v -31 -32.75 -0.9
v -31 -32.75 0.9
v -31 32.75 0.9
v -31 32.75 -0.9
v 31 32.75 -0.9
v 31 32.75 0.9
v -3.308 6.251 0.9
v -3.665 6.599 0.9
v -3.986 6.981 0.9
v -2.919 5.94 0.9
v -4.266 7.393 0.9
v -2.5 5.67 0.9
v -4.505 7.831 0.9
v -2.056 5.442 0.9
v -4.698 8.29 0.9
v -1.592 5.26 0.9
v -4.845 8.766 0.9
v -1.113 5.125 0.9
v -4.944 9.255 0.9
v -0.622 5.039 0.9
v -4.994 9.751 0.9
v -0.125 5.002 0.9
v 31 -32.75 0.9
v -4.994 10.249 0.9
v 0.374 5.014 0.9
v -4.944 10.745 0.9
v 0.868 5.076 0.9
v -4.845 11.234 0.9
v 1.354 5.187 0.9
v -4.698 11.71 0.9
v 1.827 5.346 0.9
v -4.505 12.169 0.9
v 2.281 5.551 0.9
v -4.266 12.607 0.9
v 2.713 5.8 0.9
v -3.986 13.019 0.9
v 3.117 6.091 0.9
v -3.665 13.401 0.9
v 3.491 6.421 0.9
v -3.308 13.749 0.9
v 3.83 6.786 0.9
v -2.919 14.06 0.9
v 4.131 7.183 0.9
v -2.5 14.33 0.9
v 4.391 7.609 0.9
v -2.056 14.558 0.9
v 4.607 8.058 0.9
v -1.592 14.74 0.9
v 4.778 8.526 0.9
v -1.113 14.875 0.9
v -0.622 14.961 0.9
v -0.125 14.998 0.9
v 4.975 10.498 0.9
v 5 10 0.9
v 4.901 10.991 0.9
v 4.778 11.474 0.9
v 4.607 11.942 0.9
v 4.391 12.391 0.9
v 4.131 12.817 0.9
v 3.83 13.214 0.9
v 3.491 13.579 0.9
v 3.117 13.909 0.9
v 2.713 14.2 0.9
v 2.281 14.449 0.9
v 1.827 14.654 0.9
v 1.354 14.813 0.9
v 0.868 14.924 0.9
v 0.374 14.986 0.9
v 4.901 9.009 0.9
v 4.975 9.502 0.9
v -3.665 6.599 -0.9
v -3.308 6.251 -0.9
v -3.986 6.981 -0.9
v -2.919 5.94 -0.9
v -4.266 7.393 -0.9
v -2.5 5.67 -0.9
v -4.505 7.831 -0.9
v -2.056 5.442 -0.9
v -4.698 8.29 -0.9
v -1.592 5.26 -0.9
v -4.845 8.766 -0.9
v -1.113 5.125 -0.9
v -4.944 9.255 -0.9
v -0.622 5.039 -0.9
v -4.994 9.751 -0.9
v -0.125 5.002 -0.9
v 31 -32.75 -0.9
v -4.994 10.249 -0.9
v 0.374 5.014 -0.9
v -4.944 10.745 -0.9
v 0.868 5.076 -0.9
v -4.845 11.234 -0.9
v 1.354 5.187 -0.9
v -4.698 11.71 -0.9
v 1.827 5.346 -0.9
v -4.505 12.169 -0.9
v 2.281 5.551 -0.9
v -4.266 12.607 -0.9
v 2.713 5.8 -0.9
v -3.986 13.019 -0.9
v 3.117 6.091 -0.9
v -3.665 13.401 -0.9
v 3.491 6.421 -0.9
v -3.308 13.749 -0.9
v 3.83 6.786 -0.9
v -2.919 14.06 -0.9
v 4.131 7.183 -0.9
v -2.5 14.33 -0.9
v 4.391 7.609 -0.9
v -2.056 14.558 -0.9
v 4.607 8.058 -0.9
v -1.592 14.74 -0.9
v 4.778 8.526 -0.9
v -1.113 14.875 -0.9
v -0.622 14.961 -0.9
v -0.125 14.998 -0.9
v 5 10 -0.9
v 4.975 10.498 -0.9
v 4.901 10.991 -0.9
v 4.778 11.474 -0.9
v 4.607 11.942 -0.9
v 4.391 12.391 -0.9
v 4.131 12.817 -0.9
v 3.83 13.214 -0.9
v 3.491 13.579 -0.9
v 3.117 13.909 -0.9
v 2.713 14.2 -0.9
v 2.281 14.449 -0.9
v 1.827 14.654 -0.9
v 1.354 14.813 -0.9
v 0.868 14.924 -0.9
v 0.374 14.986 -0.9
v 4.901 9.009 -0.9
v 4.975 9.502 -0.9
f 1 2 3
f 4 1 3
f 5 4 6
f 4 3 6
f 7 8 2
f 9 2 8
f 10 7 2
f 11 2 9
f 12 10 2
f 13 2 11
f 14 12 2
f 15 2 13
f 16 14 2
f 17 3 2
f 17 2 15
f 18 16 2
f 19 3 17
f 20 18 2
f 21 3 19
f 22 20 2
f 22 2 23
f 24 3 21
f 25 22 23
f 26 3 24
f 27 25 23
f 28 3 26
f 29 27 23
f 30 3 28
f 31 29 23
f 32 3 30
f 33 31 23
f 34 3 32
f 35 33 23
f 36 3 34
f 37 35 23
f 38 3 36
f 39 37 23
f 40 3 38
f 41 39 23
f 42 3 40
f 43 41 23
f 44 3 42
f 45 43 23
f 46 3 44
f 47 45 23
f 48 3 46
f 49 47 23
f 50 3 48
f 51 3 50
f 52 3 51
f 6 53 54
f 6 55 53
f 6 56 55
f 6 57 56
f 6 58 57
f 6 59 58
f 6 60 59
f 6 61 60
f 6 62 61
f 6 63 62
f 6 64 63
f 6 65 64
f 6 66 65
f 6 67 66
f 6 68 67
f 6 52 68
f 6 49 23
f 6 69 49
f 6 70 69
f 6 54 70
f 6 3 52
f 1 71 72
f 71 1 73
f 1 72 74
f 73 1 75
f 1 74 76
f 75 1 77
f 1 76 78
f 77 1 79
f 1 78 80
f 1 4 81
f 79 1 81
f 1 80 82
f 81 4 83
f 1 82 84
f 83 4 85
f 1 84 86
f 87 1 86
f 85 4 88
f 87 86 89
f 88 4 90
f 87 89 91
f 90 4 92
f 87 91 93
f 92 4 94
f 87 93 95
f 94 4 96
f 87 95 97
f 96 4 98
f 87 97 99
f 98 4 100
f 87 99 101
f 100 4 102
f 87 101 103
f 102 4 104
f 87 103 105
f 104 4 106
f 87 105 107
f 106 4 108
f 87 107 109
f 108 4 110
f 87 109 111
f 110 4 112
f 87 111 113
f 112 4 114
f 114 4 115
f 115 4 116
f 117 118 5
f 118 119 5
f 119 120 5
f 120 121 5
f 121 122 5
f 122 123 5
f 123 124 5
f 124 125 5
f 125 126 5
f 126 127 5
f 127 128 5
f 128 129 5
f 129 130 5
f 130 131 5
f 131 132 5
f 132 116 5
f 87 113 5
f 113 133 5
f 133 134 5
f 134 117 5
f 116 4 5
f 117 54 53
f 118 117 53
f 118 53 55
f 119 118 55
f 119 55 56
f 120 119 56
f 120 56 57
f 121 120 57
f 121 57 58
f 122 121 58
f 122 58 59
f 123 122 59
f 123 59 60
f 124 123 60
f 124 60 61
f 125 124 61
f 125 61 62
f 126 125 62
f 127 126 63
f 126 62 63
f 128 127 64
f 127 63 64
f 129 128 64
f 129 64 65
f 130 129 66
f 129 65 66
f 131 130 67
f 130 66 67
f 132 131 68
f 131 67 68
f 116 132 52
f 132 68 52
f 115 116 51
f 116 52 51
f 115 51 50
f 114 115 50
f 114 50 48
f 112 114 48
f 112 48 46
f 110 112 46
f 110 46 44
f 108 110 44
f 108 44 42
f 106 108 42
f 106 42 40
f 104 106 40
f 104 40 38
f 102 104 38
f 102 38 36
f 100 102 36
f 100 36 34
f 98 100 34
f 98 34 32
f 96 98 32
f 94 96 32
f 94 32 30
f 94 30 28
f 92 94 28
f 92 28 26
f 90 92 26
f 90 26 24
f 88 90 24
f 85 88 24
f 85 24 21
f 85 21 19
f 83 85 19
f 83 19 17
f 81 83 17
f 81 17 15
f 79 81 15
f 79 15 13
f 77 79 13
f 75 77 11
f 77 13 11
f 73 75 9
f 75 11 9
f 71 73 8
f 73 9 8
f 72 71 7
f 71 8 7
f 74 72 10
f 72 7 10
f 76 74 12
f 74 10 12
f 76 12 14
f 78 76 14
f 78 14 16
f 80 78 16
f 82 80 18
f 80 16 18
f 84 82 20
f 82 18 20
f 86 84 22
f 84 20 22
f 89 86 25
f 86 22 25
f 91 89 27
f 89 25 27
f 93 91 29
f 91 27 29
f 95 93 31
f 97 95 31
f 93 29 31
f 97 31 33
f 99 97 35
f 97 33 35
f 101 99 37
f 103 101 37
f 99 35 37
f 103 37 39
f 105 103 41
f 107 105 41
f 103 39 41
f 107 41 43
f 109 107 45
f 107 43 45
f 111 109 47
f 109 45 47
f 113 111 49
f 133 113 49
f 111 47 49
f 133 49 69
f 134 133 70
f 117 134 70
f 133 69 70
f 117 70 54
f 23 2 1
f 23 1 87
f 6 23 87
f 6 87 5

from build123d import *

# Parameters (mm, degrees)
SKETCH1_W           = 62
SKETCH1_H           = 65.5
BOSS_EXTRUDE1_DEPTH = 0.9
SKETCH2_R           = 5
CUT_EXTRUDE1_DEPTH  = 46.130948361


with BuildPart() as part:
    # Sketch1 → Boss-Extrude1 (new, symmetric)
    with BuildSketch(Plane.XY):
        Rectangle(SKETCH1_W, SKETCH1_H)
    extrude(amount=BOSS_EXTRUDE1_DEPTH, both=True)

    # Sketch2 → Cut-Extrude1 (cut, through all)
    with BuildSketch(Plane.XY.offset(0.9)):
        with Locations((0, 10)):
            Circle(SKETCH2_R)
    extrude(amount=-CUT_EXTRUDE1_DEPTH, mode=Mode.SUBTRACT)


solid = part.part
